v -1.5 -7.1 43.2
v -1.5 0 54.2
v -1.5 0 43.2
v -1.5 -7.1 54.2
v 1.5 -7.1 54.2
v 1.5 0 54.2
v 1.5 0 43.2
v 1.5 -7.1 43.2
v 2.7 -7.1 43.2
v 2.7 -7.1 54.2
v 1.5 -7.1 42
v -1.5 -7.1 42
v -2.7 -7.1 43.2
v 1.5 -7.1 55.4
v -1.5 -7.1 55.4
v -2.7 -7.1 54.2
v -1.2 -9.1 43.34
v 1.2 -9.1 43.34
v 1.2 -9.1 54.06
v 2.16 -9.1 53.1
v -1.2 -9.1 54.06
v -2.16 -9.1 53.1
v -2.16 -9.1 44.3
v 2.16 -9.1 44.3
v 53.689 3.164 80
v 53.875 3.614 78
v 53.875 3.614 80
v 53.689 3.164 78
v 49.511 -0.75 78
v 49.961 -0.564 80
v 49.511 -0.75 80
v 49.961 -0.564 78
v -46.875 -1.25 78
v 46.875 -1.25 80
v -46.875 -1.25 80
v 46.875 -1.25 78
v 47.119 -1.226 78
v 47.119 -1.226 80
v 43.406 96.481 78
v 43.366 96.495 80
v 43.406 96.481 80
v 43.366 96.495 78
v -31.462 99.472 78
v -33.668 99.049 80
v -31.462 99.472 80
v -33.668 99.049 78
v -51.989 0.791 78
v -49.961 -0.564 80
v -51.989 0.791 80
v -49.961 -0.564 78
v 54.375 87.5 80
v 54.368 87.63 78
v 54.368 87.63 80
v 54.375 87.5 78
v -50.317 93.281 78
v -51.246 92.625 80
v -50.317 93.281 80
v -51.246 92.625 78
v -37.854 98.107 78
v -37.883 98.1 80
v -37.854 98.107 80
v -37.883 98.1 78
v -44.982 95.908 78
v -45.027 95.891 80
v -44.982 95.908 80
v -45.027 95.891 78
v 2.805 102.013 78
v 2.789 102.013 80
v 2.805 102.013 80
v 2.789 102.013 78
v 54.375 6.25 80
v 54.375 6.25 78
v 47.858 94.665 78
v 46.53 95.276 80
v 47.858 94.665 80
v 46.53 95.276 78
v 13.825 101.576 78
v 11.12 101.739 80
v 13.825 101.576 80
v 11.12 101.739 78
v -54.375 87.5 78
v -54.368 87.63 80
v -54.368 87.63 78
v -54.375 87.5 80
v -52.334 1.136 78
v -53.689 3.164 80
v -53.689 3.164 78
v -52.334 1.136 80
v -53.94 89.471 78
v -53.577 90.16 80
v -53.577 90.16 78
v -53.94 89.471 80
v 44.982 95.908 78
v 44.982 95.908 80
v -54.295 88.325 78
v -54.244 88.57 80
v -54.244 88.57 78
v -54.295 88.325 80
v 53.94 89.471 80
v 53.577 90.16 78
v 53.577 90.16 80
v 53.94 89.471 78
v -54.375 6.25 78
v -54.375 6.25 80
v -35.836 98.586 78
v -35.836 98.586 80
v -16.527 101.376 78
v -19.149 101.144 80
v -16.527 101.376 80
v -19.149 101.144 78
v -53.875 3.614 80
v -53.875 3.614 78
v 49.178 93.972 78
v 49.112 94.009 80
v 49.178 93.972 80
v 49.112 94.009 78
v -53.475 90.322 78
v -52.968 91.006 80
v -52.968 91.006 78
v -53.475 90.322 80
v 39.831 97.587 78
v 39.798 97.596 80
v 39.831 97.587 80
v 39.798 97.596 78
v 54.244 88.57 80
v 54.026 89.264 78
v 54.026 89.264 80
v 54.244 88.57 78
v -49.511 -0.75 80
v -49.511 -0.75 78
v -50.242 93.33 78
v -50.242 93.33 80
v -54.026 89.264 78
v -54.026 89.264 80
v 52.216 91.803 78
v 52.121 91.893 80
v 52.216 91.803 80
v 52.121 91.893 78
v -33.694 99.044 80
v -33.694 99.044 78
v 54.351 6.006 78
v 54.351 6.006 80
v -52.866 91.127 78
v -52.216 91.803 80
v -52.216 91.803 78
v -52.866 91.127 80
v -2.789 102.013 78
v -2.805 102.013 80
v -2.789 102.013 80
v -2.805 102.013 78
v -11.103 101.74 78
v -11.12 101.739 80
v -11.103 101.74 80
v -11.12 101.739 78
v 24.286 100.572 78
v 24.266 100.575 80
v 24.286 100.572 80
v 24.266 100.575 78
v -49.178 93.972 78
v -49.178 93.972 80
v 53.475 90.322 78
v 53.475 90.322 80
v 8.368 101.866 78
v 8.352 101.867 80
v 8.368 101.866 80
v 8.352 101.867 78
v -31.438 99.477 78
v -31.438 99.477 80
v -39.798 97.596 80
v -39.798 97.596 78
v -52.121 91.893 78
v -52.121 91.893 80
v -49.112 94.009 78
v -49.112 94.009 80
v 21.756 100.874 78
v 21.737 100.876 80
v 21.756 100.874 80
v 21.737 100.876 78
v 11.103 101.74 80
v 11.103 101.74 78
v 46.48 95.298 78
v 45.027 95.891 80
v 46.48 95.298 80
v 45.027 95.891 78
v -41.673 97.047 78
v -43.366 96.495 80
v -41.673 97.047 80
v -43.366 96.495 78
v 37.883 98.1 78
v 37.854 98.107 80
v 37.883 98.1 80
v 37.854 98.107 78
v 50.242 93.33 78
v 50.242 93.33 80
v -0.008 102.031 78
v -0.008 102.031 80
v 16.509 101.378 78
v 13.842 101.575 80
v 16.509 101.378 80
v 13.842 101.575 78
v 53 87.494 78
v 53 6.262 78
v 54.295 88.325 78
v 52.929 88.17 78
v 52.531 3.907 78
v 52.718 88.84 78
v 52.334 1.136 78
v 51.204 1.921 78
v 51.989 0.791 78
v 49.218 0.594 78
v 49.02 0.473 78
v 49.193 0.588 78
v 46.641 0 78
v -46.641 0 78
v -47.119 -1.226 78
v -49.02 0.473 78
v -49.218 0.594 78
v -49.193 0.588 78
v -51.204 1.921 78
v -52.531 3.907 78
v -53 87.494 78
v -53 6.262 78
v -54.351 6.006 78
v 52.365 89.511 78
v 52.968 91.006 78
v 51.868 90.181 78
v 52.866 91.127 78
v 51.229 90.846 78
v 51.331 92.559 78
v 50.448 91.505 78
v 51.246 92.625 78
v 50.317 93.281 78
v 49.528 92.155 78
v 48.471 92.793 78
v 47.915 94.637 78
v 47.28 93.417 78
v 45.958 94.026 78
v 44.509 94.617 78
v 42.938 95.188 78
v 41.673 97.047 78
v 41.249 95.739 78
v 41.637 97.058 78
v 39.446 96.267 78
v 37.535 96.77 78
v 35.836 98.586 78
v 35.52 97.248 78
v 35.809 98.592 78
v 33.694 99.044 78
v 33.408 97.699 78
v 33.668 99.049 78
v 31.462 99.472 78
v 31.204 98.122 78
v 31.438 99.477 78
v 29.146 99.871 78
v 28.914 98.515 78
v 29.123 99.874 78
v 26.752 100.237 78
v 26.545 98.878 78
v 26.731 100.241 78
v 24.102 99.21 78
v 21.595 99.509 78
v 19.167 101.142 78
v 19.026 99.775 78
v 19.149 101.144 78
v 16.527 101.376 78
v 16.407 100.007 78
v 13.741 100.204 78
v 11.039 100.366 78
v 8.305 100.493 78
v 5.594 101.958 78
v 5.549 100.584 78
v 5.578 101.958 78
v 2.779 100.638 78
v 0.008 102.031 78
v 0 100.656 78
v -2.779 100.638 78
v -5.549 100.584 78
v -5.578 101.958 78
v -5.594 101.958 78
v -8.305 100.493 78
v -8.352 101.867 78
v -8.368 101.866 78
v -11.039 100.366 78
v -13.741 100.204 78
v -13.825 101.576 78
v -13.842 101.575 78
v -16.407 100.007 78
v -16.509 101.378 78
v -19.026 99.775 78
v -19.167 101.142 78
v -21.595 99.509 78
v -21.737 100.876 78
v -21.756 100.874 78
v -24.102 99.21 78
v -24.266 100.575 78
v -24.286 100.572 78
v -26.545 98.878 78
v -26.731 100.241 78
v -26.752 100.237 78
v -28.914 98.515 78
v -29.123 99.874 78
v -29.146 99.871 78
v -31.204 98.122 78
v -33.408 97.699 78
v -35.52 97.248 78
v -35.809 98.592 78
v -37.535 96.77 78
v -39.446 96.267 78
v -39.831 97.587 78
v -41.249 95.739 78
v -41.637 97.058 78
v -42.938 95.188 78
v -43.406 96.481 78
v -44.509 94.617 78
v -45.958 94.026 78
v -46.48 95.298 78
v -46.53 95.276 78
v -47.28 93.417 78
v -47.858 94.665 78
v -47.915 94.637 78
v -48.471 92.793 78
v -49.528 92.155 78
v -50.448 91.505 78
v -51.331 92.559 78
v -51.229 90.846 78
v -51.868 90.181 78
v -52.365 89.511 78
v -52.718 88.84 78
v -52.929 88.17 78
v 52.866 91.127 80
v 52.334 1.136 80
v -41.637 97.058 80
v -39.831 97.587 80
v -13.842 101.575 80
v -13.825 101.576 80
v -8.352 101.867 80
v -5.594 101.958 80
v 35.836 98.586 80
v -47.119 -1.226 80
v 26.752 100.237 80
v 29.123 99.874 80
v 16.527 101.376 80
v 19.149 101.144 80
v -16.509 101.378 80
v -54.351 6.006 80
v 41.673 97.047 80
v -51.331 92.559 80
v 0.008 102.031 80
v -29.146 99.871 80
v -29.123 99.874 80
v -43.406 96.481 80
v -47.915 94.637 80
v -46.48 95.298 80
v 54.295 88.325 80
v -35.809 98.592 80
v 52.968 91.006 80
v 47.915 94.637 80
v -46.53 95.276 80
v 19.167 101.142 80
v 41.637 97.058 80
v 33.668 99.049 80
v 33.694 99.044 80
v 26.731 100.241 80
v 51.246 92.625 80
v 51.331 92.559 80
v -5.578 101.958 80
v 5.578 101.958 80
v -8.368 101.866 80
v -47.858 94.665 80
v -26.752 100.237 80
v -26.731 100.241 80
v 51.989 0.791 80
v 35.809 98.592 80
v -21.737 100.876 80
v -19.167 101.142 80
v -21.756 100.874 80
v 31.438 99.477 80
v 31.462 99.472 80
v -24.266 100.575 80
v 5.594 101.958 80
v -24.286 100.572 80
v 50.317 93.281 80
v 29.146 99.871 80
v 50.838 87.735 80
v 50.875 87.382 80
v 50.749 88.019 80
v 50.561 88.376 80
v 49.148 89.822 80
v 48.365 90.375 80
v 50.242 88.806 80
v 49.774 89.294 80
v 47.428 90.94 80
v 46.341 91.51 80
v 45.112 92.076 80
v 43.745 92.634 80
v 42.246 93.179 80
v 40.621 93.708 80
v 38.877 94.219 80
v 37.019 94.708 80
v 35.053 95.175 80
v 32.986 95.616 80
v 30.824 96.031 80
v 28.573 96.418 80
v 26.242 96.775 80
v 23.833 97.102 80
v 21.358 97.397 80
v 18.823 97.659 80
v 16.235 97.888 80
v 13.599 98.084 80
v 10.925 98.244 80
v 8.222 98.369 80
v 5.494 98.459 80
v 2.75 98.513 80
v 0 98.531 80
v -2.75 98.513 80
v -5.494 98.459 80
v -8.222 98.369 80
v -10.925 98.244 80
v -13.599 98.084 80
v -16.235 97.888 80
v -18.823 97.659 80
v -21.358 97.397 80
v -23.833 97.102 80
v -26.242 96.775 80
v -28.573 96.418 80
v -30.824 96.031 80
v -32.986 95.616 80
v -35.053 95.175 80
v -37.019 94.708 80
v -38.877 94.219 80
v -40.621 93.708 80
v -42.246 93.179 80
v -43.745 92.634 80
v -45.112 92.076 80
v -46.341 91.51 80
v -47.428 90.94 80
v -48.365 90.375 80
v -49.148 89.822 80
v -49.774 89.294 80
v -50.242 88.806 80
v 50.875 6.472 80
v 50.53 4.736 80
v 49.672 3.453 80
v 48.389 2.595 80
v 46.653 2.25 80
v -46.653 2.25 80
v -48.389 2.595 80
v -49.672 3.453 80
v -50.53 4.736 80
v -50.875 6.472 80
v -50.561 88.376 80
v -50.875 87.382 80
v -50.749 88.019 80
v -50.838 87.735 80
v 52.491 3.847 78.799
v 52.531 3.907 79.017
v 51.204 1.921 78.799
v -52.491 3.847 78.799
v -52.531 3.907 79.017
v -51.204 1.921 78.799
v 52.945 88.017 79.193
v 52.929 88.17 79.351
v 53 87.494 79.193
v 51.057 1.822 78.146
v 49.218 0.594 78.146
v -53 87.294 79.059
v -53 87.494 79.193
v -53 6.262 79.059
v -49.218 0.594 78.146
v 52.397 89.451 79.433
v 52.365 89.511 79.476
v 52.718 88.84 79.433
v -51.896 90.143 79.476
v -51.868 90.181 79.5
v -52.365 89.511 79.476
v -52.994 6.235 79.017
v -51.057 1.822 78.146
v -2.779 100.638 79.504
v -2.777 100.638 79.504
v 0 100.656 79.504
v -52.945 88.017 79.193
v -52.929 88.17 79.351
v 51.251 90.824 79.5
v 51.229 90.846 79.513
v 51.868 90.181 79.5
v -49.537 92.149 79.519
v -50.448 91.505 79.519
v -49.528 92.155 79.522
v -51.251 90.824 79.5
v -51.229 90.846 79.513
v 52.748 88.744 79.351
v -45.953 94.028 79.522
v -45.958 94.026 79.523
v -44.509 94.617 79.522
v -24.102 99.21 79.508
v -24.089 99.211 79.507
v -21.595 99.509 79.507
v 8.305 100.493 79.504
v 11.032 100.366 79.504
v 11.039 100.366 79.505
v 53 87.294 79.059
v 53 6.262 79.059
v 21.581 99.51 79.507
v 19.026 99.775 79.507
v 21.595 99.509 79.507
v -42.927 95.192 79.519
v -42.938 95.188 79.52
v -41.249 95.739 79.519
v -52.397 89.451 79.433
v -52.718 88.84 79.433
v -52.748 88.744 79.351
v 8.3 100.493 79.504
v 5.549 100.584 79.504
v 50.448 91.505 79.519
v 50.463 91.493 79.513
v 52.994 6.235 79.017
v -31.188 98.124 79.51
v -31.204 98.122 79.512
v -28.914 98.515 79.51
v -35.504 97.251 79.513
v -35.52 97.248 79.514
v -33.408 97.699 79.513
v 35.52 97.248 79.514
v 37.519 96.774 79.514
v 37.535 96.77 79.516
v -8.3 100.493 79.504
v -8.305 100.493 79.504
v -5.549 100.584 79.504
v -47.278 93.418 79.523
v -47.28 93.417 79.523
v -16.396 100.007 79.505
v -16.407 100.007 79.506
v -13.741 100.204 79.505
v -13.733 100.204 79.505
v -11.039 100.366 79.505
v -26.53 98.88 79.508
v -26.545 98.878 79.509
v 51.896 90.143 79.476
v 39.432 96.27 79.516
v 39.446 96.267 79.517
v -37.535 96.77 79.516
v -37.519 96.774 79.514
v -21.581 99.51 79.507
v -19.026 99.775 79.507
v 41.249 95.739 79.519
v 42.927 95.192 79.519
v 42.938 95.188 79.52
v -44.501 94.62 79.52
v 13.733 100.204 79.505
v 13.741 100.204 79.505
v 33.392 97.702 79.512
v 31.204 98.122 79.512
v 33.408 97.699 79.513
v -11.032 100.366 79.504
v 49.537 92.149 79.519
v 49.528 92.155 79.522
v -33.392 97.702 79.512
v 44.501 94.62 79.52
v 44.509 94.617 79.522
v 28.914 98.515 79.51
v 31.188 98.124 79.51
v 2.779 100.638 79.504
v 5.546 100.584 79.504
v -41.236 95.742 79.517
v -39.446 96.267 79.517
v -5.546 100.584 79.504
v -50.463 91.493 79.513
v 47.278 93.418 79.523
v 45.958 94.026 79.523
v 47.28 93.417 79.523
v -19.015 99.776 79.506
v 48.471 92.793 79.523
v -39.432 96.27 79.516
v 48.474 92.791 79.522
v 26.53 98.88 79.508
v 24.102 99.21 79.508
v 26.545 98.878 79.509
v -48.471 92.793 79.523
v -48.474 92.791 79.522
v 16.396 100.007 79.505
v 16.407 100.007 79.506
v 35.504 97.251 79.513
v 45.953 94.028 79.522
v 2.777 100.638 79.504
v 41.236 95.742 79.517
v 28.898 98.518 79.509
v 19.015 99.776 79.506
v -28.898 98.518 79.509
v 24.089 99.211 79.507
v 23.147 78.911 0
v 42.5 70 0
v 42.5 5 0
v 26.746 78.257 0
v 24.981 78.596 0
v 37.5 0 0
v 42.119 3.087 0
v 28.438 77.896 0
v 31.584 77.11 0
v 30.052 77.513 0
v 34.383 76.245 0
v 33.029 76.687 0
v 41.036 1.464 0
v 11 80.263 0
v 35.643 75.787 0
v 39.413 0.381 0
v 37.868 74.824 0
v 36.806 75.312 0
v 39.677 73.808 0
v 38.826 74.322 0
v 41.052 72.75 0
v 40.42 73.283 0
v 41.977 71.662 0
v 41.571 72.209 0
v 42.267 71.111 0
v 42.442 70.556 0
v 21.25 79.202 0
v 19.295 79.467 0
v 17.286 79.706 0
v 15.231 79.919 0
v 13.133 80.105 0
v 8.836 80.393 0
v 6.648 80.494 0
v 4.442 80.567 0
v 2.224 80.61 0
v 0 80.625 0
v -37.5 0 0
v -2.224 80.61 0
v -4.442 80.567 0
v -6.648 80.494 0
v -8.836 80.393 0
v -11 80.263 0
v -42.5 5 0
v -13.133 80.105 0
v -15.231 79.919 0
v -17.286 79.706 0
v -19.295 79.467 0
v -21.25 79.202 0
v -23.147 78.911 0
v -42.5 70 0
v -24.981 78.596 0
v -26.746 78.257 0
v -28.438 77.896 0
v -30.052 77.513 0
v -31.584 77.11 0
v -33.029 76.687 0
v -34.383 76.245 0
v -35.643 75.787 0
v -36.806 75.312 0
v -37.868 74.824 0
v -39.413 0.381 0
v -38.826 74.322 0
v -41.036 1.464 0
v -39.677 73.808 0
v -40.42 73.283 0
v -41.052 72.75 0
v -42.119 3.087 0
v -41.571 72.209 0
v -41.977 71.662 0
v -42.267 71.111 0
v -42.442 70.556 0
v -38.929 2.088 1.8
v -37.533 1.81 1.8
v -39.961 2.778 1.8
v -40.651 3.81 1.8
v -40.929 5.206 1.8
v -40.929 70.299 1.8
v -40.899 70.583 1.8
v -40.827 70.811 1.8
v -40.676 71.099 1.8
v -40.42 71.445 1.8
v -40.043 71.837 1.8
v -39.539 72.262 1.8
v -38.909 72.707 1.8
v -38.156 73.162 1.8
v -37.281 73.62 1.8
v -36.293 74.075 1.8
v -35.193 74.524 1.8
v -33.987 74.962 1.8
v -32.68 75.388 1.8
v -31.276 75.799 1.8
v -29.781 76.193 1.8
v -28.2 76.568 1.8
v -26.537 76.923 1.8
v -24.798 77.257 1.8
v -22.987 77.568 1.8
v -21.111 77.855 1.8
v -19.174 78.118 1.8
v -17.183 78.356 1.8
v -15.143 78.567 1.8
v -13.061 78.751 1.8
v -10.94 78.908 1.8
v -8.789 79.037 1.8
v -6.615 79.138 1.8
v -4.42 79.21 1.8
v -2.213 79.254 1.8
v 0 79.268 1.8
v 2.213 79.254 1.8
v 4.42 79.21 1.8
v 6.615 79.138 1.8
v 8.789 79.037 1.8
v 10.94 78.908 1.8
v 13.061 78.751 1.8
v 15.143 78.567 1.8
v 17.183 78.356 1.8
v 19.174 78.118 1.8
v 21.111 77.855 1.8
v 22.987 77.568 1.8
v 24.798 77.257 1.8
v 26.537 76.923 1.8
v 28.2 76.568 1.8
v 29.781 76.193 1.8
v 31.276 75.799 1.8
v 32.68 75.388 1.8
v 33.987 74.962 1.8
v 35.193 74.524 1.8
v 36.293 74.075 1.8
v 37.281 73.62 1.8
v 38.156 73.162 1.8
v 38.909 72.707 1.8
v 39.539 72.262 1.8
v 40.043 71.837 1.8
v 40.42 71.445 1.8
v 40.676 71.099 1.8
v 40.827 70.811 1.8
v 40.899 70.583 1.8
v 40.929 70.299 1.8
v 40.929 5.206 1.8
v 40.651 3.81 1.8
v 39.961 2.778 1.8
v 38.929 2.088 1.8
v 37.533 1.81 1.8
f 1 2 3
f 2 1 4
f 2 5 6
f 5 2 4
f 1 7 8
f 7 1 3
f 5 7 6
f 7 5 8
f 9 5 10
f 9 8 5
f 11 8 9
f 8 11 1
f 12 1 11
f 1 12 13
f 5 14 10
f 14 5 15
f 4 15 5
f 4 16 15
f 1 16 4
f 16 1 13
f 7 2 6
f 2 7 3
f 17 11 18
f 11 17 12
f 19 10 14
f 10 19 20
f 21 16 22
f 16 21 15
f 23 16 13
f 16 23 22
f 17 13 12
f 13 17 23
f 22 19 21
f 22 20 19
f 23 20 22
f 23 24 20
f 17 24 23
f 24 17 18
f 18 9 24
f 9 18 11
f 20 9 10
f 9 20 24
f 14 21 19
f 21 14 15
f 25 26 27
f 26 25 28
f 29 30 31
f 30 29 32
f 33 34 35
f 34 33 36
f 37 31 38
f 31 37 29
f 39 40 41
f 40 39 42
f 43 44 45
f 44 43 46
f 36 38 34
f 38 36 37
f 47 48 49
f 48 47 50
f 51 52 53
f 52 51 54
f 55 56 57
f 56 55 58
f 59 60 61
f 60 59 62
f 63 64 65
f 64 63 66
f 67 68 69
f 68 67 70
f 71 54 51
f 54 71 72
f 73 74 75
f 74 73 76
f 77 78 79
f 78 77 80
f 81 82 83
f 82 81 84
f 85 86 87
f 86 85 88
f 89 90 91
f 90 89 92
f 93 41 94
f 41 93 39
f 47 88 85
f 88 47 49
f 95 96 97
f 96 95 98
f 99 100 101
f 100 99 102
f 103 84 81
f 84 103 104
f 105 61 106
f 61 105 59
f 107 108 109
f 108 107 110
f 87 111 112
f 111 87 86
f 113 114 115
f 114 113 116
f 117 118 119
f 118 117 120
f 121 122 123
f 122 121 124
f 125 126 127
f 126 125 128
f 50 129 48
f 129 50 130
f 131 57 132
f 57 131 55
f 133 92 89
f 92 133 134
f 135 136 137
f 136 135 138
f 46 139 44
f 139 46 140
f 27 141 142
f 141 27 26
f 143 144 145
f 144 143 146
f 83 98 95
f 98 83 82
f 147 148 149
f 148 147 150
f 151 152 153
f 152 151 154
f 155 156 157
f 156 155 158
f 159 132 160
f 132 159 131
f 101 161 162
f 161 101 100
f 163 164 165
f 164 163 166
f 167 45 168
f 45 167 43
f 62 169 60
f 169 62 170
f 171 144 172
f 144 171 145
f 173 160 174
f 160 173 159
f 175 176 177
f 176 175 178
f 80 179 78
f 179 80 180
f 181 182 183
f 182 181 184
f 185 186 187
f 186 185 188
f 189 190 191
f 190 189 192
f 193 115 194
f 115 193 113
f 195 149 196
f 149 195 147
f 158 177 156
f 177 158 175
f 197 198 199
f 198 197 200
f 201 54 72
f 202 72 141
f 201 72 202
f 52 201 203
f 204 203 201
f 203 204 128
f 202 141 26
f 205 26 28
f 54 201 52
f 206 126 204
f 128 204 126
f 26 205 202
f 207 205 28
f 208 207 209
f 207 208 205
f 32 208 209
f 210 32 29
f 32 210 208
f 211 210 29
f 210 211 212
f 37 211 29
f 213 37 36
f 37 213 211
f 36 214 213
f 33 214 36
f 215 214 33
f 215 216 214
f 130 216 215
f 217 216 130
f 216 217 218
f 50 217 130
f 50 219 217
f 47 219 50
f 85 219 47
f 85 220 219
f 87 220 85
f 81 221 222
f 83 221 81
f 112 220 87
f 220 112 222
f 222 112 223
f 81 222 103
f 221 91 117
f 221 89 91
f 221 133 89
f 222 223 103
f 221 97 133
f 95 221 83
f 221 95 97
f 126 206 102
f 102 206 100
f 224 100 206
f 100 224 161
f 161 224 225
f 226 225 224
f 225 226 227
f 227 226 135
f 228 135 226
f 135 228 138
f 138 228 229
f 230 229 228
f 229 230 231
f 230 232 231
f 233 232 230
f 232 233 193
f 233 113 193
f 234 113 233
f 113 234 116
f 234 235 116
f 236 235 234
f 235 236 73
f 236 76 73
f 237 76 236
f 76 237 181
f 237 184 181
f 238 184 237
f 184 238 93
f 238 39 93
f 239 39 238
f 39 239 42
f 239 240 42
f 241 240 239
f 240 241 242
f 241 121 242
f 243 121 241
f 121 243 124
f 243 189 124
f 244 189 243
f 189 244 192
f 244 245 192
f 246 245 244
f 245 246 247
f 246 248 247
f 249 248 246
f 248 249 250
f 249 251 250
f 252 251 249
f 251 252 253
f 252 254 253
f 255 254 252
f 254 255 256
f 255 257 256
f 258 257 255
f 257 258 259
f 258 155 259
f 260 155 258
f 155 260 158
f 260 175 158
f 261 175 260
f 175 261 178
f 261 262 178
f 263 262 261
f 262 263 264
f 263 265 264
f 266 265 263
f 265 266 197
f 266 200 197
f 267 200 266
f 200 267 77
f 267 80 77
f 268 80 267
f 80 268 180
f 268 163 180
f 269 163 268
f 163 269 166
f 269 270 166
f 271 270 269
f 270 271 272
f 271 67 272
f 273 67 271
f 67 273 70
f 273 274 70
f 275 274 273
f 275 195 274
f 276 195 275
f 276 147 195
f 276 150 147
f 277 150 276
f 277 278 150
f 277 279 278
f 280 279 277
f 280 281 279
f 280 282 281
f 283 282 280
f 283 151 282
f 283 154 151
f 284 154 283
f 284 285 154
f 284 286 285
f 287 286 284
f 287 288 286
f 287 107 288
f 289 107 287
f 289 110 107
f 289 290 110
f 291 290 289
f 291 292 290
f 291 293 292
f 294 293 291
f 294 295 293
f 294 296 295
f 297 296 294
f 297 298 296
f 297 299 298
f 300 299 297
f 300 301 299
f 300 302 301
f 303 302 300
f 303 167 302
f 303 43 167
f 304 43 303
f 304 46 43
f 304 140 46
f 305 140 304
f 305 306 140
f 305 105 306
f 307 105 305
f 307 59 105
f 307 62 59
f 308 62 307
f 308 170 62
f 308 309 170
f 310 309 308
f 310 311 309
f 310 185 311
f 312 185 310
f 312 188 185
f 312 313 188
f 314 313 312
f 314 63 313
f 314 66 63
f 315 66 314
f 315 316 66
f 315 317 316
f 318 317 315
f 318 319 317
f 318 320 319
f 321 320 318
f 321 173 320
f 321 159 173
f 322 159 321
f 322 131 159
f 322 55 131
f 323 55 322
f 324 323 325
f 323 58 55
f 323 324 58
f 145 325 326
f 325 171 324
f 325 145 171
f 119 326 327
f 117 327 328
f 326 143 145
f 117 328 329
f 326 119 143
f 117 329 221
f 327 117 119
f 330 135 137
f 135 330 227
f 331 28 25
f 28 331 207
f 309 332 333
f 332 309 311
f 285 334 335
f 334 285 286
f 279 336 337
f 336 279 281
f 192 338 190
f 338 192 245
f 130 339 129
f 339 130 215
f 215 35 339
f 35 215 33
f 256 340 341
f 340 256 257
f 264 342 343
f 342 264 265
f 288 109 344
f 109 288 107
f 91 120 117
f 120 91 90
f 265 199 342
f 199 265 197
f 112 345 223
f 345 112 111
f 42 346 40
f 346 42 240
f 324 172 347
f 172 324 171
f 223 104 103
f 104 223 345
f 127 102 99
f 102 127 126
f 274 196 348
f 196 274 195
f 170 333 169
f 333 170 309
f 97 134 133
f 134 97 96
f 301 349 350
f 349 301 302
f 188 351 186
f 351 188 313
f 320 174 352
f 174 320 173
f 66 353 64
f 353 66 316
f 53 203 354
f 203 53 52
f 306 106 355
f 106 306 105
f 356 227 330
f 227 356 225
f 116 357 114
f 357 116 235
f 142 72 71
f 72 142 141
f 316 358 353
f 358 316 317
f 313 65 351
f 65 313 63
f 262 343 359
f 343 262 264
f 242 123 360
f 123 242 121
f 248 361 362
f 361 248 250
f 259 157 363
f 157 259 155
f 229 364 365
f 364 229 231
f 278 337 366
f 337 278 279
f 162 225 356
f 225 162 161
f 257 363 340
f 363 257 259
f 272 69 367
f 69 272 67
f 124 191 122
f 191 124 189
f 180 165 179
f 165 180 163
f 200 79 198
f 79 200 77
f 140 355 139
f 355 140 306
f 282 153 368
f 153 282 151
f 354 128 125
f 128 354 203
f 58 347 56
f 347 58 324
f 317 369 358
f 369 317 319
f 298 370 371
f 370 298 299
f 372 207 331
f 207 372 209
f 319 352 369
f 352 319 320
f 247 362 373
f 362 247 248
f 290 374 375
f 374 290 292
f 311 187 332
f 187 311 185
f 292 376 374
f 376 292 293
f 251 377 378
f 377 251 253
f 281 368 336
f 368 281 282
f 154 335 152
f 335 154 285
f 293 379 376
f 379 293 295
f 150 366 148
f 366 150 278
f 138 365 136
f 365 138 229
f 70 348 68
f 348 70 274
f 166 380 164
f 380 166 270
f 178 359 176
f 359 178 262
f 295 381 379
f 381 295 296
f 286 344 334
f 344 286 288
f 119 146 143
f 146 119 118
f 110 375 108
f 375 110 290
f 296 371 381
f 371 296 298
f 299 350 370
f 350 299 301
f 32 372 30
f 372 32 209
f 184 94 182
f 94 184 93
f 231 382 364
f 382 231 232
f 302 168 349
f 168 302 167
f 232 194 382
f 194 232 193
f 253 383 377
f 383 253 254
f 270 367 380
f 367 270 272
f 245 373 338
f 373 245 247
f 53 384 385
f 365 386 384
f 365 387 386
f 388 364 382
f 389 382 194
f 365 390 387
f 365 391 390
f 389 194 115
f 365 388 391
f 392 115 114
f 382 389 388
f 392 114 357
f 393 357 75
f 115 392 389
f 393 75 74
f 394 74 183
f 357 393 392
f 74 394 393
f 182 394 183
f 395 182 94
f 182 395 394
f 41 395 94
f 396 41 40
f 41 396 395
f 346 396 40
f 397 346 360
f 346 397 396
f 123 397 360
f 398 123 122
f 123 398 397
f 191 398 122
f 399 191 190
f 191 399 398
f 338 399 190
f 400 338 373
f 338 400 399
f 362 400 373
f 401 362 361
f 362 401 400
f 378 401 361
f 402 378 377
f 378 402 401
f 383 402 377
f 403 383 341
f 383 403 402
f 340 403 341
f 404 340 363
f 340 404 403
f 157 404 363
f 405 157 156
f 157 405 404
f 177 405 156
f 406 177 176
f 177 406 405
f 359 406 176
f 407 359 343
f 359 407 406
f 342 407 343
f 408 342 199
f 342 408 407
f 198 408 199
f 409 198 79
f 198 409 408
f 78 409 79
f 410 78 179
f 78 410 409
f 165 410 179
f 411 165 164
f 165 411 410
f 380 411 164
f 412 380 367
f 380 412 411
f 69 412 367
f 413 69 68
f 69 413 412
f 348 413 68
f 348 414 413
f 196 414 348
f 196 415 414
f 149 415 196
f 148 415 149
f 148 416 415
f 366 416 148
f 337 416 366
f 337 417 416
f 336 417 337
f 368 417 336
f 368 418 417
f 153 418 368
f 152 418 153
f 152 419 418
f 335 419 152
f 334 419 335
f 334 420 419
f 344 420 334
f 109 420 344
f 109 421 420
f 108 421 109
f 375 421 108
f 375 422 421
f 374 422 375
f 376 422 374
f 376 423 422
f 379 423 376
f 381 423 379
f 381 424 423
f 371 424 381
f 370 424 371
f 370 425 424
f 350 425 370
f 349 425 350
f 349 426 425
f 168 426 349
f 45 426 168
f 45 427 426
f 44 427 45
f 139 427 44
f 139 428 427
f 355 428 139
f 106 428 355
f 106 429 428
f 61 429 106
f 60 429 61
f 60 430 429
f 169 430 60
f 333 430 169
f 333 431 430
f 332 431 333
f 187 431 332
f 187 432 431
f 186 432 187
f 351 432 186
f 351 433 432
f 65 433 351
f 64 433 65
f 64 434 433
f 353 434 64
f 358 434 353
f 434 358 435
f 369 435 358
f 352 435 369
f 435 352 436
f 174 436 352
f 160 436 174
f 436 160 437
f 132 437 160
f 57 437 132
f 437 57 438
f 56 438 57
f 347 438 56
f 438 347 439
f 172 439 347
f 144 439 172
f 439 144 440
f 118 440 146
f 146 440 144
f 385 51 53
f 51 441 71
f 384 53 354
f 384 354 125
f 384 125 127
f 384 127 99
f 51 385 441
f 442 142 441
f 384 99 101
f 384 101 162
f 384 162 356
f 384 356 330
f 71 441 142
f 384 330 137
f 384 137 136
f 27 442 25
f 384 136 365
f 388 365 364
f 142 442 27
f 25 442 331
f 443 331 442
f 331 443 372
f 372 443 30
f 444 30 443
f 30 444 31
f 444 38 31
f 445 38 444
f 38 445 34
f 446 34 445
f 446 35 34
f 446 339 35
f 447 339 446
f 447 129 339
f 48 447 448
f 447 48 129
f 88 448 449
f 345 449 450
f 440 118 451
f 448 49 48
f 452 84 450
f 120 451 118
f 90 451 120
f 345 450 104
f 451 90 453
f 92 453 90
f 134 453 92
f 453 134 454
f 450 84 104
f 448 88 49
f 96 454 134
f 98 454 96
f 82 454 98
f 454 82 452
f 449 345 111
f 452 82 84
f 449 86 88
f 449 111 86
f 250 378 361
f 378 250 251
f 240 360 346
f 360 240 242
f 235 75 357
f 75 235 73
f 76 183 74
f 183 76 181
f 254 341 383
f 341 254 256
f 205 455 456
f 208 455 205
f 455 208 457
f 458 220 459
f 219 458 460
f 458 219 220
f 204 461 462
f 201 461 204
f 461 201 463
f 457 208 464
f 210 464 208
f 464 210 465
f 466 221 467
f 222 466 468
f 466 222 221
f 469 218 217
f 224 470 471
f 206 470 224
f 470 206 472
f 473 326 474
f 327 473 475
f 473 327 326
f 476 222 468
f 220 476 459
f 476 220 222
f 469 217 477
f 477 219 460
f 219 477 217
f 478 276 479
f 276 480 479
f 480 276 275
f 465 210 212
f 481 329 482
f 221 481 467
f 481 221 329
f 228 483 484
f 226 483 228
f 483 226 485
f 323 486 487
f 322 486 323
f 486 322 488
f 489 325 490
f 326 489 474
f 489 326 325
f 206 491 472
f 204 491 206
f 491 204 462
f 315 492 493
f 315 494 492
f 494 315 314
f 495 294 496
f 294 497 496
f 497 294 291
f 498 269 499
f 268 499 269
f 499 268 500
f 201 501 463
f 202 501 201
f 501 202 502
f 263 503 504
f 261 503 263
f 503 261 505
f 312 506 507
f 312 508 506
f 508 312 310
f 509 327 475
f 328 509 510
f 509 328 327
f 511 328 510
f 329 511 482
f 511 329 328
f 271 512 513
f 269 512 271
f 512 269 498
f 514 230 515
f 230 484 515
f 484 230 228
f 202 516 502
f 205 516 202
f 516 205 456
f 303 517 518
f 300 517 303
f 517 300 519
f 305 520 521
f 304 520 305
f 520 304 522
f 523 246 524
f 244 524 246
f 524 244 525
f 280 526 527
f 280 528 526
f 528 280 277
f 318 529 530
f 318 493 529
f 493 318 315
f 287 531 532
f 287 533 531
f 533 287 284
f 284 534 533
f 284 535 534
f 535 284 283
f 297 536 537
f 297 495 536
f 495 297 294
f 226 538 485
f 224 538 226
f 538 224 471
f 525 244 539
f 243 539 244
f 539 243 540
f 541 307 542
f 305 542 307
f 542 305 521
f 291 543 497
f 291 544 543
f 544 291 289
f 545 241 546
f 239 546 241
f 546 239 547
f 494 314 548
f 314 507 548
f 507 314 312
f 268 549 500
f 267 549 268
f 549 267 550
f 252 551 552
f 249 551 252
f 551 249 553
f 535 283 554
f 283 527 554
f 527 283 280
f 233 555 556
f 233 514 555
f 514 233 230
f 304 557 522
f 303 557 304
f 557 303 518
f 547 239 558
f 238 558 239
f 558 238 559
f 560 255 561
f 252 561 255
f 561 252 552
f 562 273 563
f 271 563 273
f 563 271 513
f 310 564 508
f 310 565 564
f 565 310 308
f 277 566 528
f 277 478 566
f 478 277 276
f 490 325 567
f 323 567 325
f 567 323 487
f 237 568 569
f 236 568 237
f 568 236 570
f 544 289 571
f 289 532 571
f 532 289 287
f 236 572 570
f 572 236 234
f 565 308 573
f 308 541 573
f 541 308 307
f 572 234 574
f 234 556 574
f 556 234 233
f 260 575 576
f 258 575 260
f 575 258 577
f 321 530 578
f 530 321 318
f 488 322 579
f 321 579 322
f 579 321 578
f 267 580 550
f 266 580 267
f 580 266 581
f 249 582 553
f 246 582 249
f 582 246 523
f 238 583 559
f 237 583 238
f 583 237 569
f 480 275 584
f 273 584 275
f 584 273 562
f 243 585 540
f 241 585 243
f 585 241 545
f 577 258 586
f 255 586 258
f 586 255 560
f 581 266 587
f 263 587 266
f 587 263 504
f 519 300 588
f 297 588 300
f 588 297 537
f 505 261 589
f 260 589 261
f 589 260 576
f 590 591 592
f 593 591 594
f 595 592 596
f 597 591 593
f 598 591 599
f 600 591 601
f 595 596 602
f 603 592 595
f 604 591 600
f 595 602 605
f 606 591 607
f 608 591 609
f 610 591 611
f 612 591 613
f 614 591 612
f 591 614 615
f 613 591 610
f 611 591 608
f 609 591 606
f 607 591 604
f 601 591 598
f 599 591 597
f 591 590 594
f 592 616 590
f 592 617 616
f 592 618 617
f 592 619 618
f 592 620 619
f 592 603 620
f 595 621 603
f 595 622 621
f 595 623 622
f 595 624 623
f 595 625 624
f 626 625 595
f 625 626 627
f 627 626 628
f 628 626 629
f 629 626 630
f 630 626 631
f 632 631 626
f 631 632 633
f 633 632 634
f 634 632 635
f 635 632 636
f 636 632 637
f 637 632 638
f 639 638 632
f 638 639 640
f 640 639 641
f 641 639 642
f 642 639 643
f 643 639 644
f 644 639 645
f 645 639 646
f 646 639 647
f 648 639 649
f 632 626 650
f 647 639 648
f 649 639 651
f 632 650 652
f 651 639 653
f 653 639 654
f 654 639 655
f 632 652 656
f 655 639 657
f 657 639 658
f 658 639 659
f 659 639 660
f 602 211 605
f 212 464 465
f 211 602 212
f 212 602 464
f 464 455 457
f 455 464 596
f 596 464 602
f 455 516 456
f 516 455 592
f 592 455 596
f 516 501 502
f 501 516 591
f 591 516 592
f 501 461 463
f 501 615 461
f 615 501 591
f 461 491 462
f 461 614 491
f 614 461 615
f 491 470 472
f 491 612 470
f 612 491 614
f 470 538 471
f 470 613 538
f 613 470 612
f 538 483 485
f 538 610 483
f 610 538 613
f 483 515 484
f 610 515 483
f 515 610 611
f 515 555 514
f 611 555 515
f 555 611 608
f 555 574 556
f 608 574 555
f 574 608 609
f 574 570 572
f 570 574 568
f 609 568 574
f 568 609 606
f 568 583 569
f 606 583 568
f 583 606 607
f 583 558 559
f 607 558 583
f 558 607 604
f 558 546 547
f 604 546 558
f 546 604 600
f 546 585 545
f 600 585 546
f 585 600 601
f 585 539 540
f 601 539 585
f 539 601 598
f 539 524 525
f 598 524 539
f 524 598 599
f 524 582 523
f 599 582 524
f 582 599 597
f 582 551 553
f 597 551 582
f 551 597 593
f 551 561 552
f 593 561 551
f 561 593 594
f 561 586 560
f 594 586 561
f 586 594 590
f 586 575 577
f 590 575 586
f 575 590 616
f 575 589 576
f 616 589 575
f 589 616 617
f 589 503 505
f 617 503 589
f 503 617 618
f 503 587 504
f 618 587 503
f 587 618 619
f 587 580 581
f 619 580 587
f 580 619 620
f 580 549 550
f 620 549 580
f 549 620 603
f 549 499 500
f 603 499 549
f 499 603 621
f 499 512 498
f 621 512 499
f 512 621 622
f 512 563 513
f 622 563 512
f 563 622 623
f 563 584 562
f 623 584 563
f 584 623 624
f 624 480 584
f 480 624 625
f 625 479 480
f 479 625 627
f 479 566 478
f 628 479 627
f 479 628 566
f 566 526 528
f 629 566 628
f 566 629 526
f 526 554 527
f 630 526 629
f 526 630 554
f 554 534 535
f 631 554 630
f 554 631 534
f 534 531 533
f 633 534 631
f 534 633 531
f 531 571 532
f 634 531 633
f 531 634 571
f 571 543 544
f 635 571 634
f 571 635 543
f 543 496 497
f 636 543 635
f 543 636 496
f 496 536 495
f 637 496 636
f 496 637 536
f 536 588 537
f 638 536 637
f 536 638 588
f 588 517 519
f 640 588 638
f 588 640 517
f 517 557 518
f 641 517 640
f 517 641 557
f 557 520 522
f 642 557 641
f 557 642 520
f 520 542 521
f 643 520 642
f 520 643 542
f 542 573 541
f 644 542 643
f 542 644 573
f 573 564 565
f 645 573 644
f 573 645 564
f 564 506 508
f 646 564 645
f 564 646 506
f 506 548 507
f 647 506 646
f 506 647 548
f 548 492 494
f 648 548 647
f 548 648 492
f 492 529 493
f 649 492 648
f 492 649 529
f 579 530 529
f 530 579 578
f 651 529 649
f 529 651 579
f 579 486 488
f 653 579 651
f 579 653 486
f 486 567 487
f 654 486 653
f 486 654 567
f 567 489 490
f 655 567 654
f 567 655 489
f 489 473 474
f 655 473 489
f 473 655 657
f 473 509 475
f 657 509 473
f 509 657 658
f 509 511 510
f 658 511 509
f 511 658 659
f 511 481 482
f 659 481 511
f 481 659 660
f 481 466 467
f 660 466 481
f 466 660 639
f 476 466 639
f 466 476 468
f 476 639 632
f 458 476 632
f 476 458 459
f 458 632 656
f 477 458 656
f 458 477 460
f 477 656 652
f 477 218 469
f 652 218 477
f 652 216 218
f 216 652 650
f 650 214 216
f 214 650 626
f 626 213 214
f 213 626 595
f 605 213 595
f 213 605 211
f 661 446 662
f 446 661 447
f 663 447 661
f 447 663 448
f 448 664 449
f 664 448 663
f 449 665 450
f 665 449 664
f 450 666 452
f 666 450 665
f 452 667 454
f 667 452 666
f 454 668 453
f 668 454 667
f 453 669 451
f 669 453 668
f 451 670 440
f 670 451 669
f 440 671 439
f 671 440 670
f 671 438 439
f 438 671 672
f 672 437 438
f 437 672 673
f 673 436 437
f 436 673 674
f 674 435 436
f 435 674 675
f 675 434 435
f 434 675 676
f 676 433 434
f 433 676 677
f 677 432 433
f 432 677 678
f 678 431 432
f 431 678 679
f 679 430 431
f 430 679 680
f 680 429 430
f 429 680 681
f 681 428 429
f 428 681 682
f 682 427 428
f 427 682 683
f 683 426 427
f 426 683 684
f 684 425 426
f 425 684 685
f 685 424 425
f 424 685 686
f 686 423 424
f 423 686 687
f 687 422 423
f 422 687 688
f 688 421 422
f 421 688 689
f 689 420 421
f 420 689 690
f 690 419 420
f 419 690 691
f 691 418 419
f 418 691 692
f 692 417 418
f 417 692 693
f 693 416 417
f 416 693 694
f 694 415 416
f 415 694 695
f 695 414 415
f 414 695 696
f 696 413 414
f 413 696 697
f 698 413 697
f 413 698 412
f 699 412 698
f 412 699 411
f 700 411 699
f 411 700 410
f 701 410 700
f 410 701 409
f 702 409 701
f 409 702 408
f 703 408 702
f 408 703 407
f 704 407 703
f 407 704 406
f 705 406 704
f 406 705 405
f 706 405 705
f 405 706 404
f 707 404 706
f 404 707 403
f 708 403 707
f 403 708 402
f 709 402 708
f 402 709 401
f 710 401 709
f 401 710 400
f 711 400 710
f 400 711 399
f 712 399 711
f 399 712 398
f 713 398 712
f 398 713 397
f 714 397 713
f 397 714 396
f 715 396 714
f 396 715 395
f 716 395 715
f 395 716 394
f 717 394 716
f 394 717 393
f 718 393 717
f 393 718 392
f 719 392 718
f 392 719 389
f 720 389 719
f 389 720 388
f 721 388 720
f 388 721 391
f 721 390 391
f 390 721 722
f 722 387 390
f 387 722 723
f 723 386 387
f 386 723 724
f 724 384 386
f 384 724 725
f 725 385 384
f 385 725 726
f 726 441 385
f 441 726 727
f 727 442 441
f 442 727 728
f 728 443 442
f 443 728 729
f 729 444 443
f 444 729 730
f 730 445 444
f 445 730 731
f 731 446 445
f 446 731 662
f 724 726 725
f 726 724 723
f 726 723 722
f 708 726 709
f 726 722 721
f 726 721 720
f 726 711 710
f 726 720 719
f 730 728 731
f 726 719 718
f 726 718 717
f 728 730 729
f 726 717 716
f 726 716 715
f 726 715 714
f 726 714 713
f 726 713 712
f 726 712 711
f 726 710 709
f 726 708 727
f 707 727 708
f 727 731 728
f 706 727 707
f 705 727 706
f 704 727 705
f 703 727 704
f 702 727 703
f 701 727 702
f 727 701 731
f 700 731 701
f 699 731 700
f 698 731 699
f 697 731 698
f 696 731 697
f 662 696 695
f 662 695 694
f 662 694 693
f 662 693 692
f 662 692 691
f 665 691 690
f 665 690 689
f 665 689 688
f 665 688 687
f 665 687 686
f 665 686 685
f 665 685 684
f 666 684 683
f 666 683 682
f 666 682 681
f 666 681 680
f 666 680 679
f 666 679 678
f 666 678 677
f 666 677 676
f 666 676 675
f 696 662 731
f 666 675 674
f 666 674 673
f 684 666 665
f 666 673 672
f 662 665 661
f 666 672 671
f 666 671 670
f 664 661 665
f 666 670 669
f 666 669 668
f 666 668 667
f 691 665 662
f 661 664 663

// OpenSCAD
basket_width=75;
basket_depth=60;
basket_height=80;
basket_scale=1.25;
basket_projection_scale=0.25;
basket_round_radius=5;

basket_brim_width=2;
basket_brim_height=2;

wallwidth=1.8;

clip_stem_depth=7.1;
clip_stem_height=11;
clip_stem_width=3;
clip_lock_depth=2;
clip_lock_scale=0.8;
clip_lock_width=5.4;
clip_overhang=(clip_lock_width-clip_stem_width)/2;
clip_height=clip_stem_height + clip_overhang*2;
clip_depth=clip_stem_depth + clip_lock_depth;
clip_width=clip_lock_width;

clip_z=48.7;
clip_x=0;
clips_wide=1;
clips_high=1;
clips_x_spacing=88;
clips_z_spacing=62.5;


basket_full_depth=basket_depth+2*basket_round_radius;
basket_full_width=basket_width+2*basket_round_radius;

drainage=false;
base_holes=[
    [0, 0.3, 10],
    [-0.5, -0.5, 8],
    [-0.5, 1, 8],
    [0.5, -0.5, 8],
    [0.5, 1, 8]
];

module rotate_axis(axis, d) {
    rotate(list_for_axis(axis, d)) children();
}

module xrotate(d) {
    rotate_axis("x", d) children();
}

module yrotate(d) {
    rotate_axis("y", d) children();
}

module zrotate(d) {
    rotate_axis("z", d) children();
}

function list_for_axis(axis, d) =
(
    axis=="x" ? [d, 0, 0] : (
        axis=="y" ? [0, d, 0] : (
            axis=="z" ? [0, 0, d] : [0, 0, 0]))
);

module translate_axis(axis, d) {
    translate(list_for_axis(axis, d)) children();
}

module xmove(d) {
    translate_axis("x", d) children();
}

module ymove(d) {
    translate_axis("y", d) children();
}

module zmove(d) {
    translate_axis("z", d) children();
}

module spread_axis(axis, d, n=1) {
    x = d/2;
    if(d==0 || n==0) {
        children();
    }
    else
    {
        for(i=[-x:(d/n):x]) {
            translate_axis(axis, i) children();
        }
    } 
}

module xspread(d, n=1)
{
    spread_axis("x", d, n) children();
}

module yspread(d, n=1)
{
    spread_axis("y", d, n) children();
}


module zspread(d, n=1)
{
    spread_axis("z", d, n) children();
}

module keyhole() {
    xmove(-3.5/2) square([3.5, 9]);
    xmove(-3) ymove(9) square([6, 15]);
}


                
// size: [clip_width, clip_depth]
module clip() {
    ymove(-clip_lock_depth/2) {
        cube(size=[clip_stem_width, clip_stem_depth, clip_stem_height], center=true);
        ymove(clip_stem_depth/2) xrotate(90) mirror([0,0,1]) linear_extrude(clip_lock_depth, scale=clip_lock_scale) offset(clip_overhang) square(size=[clip_stem_width, clip_stem_height], center=true);
    }
}

module basket_shape() {
    union() {
        offset(basket_round_radius) square(size=[basket_width, basket_depth], center=true);
        
        ymove(basket_depth/2+basket_round_radius/2) square(size=[basket_full_width, basket_round_radius], center=true);
        difference() {
            ymove(basket_depth/2+basket_round_radius) scale([1, basket_projection_scale, 1]) circle(basket_full_width/2, center=true, $fn=120);
            ymove(-basket_width/2-basket_round_radius) square(size=[basket_width+basket_round_radius*2, basket_width+basket_round_radius*2], center=true);
      }
    }
}

module basket_base() {
    difference()
    {
        linear_extrude(wallwidth) basket_shape();
        if(drainage) zmove(-0.1) {
            for(hole=base_holes)
            {
                xmove(hole[0]*basket_full_width/2)
                ymove(hole[1]*basket_full_depth/2) cylinder(h=wallwidth+0.2, d=hole[2]);
            }
        }
    }
}


module basket_outline() {
    difference()
    {
        basket_shape();
        offset(-wallwidth) basket_shape();
    }
}

module basket_brim() {
    difference()
    {
        scale([basket_scale, basket_scale, 1]) linear_extrude(basket_brim_height) offset(basket_brim_width/2) basket_shape();
        scale([basket_scale, basket_scale, 1]) zmove(-0.1) linear_extrude(basket_brim_height+0.2) offset(-0.1) basket_shape();
    }
}

module basket() {
    xspread(clips_x_spacing, n=clips_wide-1) zspread(clips_z_spacing, n=clips_high-1) zmove(clip_z) ymove(-clip_depth/2) zrotate(180) clip();
    linear_extrude(basket_height, scale=basket_scale) ymove(basket_full_depth/2) basket_outline();
    ymove(basket_full_depth/2) basket_base();
    zmove(basket_height-basket_brim_height) ymove(basket_full_depth*basket_scale/2) basket_brim();
}
basket();
